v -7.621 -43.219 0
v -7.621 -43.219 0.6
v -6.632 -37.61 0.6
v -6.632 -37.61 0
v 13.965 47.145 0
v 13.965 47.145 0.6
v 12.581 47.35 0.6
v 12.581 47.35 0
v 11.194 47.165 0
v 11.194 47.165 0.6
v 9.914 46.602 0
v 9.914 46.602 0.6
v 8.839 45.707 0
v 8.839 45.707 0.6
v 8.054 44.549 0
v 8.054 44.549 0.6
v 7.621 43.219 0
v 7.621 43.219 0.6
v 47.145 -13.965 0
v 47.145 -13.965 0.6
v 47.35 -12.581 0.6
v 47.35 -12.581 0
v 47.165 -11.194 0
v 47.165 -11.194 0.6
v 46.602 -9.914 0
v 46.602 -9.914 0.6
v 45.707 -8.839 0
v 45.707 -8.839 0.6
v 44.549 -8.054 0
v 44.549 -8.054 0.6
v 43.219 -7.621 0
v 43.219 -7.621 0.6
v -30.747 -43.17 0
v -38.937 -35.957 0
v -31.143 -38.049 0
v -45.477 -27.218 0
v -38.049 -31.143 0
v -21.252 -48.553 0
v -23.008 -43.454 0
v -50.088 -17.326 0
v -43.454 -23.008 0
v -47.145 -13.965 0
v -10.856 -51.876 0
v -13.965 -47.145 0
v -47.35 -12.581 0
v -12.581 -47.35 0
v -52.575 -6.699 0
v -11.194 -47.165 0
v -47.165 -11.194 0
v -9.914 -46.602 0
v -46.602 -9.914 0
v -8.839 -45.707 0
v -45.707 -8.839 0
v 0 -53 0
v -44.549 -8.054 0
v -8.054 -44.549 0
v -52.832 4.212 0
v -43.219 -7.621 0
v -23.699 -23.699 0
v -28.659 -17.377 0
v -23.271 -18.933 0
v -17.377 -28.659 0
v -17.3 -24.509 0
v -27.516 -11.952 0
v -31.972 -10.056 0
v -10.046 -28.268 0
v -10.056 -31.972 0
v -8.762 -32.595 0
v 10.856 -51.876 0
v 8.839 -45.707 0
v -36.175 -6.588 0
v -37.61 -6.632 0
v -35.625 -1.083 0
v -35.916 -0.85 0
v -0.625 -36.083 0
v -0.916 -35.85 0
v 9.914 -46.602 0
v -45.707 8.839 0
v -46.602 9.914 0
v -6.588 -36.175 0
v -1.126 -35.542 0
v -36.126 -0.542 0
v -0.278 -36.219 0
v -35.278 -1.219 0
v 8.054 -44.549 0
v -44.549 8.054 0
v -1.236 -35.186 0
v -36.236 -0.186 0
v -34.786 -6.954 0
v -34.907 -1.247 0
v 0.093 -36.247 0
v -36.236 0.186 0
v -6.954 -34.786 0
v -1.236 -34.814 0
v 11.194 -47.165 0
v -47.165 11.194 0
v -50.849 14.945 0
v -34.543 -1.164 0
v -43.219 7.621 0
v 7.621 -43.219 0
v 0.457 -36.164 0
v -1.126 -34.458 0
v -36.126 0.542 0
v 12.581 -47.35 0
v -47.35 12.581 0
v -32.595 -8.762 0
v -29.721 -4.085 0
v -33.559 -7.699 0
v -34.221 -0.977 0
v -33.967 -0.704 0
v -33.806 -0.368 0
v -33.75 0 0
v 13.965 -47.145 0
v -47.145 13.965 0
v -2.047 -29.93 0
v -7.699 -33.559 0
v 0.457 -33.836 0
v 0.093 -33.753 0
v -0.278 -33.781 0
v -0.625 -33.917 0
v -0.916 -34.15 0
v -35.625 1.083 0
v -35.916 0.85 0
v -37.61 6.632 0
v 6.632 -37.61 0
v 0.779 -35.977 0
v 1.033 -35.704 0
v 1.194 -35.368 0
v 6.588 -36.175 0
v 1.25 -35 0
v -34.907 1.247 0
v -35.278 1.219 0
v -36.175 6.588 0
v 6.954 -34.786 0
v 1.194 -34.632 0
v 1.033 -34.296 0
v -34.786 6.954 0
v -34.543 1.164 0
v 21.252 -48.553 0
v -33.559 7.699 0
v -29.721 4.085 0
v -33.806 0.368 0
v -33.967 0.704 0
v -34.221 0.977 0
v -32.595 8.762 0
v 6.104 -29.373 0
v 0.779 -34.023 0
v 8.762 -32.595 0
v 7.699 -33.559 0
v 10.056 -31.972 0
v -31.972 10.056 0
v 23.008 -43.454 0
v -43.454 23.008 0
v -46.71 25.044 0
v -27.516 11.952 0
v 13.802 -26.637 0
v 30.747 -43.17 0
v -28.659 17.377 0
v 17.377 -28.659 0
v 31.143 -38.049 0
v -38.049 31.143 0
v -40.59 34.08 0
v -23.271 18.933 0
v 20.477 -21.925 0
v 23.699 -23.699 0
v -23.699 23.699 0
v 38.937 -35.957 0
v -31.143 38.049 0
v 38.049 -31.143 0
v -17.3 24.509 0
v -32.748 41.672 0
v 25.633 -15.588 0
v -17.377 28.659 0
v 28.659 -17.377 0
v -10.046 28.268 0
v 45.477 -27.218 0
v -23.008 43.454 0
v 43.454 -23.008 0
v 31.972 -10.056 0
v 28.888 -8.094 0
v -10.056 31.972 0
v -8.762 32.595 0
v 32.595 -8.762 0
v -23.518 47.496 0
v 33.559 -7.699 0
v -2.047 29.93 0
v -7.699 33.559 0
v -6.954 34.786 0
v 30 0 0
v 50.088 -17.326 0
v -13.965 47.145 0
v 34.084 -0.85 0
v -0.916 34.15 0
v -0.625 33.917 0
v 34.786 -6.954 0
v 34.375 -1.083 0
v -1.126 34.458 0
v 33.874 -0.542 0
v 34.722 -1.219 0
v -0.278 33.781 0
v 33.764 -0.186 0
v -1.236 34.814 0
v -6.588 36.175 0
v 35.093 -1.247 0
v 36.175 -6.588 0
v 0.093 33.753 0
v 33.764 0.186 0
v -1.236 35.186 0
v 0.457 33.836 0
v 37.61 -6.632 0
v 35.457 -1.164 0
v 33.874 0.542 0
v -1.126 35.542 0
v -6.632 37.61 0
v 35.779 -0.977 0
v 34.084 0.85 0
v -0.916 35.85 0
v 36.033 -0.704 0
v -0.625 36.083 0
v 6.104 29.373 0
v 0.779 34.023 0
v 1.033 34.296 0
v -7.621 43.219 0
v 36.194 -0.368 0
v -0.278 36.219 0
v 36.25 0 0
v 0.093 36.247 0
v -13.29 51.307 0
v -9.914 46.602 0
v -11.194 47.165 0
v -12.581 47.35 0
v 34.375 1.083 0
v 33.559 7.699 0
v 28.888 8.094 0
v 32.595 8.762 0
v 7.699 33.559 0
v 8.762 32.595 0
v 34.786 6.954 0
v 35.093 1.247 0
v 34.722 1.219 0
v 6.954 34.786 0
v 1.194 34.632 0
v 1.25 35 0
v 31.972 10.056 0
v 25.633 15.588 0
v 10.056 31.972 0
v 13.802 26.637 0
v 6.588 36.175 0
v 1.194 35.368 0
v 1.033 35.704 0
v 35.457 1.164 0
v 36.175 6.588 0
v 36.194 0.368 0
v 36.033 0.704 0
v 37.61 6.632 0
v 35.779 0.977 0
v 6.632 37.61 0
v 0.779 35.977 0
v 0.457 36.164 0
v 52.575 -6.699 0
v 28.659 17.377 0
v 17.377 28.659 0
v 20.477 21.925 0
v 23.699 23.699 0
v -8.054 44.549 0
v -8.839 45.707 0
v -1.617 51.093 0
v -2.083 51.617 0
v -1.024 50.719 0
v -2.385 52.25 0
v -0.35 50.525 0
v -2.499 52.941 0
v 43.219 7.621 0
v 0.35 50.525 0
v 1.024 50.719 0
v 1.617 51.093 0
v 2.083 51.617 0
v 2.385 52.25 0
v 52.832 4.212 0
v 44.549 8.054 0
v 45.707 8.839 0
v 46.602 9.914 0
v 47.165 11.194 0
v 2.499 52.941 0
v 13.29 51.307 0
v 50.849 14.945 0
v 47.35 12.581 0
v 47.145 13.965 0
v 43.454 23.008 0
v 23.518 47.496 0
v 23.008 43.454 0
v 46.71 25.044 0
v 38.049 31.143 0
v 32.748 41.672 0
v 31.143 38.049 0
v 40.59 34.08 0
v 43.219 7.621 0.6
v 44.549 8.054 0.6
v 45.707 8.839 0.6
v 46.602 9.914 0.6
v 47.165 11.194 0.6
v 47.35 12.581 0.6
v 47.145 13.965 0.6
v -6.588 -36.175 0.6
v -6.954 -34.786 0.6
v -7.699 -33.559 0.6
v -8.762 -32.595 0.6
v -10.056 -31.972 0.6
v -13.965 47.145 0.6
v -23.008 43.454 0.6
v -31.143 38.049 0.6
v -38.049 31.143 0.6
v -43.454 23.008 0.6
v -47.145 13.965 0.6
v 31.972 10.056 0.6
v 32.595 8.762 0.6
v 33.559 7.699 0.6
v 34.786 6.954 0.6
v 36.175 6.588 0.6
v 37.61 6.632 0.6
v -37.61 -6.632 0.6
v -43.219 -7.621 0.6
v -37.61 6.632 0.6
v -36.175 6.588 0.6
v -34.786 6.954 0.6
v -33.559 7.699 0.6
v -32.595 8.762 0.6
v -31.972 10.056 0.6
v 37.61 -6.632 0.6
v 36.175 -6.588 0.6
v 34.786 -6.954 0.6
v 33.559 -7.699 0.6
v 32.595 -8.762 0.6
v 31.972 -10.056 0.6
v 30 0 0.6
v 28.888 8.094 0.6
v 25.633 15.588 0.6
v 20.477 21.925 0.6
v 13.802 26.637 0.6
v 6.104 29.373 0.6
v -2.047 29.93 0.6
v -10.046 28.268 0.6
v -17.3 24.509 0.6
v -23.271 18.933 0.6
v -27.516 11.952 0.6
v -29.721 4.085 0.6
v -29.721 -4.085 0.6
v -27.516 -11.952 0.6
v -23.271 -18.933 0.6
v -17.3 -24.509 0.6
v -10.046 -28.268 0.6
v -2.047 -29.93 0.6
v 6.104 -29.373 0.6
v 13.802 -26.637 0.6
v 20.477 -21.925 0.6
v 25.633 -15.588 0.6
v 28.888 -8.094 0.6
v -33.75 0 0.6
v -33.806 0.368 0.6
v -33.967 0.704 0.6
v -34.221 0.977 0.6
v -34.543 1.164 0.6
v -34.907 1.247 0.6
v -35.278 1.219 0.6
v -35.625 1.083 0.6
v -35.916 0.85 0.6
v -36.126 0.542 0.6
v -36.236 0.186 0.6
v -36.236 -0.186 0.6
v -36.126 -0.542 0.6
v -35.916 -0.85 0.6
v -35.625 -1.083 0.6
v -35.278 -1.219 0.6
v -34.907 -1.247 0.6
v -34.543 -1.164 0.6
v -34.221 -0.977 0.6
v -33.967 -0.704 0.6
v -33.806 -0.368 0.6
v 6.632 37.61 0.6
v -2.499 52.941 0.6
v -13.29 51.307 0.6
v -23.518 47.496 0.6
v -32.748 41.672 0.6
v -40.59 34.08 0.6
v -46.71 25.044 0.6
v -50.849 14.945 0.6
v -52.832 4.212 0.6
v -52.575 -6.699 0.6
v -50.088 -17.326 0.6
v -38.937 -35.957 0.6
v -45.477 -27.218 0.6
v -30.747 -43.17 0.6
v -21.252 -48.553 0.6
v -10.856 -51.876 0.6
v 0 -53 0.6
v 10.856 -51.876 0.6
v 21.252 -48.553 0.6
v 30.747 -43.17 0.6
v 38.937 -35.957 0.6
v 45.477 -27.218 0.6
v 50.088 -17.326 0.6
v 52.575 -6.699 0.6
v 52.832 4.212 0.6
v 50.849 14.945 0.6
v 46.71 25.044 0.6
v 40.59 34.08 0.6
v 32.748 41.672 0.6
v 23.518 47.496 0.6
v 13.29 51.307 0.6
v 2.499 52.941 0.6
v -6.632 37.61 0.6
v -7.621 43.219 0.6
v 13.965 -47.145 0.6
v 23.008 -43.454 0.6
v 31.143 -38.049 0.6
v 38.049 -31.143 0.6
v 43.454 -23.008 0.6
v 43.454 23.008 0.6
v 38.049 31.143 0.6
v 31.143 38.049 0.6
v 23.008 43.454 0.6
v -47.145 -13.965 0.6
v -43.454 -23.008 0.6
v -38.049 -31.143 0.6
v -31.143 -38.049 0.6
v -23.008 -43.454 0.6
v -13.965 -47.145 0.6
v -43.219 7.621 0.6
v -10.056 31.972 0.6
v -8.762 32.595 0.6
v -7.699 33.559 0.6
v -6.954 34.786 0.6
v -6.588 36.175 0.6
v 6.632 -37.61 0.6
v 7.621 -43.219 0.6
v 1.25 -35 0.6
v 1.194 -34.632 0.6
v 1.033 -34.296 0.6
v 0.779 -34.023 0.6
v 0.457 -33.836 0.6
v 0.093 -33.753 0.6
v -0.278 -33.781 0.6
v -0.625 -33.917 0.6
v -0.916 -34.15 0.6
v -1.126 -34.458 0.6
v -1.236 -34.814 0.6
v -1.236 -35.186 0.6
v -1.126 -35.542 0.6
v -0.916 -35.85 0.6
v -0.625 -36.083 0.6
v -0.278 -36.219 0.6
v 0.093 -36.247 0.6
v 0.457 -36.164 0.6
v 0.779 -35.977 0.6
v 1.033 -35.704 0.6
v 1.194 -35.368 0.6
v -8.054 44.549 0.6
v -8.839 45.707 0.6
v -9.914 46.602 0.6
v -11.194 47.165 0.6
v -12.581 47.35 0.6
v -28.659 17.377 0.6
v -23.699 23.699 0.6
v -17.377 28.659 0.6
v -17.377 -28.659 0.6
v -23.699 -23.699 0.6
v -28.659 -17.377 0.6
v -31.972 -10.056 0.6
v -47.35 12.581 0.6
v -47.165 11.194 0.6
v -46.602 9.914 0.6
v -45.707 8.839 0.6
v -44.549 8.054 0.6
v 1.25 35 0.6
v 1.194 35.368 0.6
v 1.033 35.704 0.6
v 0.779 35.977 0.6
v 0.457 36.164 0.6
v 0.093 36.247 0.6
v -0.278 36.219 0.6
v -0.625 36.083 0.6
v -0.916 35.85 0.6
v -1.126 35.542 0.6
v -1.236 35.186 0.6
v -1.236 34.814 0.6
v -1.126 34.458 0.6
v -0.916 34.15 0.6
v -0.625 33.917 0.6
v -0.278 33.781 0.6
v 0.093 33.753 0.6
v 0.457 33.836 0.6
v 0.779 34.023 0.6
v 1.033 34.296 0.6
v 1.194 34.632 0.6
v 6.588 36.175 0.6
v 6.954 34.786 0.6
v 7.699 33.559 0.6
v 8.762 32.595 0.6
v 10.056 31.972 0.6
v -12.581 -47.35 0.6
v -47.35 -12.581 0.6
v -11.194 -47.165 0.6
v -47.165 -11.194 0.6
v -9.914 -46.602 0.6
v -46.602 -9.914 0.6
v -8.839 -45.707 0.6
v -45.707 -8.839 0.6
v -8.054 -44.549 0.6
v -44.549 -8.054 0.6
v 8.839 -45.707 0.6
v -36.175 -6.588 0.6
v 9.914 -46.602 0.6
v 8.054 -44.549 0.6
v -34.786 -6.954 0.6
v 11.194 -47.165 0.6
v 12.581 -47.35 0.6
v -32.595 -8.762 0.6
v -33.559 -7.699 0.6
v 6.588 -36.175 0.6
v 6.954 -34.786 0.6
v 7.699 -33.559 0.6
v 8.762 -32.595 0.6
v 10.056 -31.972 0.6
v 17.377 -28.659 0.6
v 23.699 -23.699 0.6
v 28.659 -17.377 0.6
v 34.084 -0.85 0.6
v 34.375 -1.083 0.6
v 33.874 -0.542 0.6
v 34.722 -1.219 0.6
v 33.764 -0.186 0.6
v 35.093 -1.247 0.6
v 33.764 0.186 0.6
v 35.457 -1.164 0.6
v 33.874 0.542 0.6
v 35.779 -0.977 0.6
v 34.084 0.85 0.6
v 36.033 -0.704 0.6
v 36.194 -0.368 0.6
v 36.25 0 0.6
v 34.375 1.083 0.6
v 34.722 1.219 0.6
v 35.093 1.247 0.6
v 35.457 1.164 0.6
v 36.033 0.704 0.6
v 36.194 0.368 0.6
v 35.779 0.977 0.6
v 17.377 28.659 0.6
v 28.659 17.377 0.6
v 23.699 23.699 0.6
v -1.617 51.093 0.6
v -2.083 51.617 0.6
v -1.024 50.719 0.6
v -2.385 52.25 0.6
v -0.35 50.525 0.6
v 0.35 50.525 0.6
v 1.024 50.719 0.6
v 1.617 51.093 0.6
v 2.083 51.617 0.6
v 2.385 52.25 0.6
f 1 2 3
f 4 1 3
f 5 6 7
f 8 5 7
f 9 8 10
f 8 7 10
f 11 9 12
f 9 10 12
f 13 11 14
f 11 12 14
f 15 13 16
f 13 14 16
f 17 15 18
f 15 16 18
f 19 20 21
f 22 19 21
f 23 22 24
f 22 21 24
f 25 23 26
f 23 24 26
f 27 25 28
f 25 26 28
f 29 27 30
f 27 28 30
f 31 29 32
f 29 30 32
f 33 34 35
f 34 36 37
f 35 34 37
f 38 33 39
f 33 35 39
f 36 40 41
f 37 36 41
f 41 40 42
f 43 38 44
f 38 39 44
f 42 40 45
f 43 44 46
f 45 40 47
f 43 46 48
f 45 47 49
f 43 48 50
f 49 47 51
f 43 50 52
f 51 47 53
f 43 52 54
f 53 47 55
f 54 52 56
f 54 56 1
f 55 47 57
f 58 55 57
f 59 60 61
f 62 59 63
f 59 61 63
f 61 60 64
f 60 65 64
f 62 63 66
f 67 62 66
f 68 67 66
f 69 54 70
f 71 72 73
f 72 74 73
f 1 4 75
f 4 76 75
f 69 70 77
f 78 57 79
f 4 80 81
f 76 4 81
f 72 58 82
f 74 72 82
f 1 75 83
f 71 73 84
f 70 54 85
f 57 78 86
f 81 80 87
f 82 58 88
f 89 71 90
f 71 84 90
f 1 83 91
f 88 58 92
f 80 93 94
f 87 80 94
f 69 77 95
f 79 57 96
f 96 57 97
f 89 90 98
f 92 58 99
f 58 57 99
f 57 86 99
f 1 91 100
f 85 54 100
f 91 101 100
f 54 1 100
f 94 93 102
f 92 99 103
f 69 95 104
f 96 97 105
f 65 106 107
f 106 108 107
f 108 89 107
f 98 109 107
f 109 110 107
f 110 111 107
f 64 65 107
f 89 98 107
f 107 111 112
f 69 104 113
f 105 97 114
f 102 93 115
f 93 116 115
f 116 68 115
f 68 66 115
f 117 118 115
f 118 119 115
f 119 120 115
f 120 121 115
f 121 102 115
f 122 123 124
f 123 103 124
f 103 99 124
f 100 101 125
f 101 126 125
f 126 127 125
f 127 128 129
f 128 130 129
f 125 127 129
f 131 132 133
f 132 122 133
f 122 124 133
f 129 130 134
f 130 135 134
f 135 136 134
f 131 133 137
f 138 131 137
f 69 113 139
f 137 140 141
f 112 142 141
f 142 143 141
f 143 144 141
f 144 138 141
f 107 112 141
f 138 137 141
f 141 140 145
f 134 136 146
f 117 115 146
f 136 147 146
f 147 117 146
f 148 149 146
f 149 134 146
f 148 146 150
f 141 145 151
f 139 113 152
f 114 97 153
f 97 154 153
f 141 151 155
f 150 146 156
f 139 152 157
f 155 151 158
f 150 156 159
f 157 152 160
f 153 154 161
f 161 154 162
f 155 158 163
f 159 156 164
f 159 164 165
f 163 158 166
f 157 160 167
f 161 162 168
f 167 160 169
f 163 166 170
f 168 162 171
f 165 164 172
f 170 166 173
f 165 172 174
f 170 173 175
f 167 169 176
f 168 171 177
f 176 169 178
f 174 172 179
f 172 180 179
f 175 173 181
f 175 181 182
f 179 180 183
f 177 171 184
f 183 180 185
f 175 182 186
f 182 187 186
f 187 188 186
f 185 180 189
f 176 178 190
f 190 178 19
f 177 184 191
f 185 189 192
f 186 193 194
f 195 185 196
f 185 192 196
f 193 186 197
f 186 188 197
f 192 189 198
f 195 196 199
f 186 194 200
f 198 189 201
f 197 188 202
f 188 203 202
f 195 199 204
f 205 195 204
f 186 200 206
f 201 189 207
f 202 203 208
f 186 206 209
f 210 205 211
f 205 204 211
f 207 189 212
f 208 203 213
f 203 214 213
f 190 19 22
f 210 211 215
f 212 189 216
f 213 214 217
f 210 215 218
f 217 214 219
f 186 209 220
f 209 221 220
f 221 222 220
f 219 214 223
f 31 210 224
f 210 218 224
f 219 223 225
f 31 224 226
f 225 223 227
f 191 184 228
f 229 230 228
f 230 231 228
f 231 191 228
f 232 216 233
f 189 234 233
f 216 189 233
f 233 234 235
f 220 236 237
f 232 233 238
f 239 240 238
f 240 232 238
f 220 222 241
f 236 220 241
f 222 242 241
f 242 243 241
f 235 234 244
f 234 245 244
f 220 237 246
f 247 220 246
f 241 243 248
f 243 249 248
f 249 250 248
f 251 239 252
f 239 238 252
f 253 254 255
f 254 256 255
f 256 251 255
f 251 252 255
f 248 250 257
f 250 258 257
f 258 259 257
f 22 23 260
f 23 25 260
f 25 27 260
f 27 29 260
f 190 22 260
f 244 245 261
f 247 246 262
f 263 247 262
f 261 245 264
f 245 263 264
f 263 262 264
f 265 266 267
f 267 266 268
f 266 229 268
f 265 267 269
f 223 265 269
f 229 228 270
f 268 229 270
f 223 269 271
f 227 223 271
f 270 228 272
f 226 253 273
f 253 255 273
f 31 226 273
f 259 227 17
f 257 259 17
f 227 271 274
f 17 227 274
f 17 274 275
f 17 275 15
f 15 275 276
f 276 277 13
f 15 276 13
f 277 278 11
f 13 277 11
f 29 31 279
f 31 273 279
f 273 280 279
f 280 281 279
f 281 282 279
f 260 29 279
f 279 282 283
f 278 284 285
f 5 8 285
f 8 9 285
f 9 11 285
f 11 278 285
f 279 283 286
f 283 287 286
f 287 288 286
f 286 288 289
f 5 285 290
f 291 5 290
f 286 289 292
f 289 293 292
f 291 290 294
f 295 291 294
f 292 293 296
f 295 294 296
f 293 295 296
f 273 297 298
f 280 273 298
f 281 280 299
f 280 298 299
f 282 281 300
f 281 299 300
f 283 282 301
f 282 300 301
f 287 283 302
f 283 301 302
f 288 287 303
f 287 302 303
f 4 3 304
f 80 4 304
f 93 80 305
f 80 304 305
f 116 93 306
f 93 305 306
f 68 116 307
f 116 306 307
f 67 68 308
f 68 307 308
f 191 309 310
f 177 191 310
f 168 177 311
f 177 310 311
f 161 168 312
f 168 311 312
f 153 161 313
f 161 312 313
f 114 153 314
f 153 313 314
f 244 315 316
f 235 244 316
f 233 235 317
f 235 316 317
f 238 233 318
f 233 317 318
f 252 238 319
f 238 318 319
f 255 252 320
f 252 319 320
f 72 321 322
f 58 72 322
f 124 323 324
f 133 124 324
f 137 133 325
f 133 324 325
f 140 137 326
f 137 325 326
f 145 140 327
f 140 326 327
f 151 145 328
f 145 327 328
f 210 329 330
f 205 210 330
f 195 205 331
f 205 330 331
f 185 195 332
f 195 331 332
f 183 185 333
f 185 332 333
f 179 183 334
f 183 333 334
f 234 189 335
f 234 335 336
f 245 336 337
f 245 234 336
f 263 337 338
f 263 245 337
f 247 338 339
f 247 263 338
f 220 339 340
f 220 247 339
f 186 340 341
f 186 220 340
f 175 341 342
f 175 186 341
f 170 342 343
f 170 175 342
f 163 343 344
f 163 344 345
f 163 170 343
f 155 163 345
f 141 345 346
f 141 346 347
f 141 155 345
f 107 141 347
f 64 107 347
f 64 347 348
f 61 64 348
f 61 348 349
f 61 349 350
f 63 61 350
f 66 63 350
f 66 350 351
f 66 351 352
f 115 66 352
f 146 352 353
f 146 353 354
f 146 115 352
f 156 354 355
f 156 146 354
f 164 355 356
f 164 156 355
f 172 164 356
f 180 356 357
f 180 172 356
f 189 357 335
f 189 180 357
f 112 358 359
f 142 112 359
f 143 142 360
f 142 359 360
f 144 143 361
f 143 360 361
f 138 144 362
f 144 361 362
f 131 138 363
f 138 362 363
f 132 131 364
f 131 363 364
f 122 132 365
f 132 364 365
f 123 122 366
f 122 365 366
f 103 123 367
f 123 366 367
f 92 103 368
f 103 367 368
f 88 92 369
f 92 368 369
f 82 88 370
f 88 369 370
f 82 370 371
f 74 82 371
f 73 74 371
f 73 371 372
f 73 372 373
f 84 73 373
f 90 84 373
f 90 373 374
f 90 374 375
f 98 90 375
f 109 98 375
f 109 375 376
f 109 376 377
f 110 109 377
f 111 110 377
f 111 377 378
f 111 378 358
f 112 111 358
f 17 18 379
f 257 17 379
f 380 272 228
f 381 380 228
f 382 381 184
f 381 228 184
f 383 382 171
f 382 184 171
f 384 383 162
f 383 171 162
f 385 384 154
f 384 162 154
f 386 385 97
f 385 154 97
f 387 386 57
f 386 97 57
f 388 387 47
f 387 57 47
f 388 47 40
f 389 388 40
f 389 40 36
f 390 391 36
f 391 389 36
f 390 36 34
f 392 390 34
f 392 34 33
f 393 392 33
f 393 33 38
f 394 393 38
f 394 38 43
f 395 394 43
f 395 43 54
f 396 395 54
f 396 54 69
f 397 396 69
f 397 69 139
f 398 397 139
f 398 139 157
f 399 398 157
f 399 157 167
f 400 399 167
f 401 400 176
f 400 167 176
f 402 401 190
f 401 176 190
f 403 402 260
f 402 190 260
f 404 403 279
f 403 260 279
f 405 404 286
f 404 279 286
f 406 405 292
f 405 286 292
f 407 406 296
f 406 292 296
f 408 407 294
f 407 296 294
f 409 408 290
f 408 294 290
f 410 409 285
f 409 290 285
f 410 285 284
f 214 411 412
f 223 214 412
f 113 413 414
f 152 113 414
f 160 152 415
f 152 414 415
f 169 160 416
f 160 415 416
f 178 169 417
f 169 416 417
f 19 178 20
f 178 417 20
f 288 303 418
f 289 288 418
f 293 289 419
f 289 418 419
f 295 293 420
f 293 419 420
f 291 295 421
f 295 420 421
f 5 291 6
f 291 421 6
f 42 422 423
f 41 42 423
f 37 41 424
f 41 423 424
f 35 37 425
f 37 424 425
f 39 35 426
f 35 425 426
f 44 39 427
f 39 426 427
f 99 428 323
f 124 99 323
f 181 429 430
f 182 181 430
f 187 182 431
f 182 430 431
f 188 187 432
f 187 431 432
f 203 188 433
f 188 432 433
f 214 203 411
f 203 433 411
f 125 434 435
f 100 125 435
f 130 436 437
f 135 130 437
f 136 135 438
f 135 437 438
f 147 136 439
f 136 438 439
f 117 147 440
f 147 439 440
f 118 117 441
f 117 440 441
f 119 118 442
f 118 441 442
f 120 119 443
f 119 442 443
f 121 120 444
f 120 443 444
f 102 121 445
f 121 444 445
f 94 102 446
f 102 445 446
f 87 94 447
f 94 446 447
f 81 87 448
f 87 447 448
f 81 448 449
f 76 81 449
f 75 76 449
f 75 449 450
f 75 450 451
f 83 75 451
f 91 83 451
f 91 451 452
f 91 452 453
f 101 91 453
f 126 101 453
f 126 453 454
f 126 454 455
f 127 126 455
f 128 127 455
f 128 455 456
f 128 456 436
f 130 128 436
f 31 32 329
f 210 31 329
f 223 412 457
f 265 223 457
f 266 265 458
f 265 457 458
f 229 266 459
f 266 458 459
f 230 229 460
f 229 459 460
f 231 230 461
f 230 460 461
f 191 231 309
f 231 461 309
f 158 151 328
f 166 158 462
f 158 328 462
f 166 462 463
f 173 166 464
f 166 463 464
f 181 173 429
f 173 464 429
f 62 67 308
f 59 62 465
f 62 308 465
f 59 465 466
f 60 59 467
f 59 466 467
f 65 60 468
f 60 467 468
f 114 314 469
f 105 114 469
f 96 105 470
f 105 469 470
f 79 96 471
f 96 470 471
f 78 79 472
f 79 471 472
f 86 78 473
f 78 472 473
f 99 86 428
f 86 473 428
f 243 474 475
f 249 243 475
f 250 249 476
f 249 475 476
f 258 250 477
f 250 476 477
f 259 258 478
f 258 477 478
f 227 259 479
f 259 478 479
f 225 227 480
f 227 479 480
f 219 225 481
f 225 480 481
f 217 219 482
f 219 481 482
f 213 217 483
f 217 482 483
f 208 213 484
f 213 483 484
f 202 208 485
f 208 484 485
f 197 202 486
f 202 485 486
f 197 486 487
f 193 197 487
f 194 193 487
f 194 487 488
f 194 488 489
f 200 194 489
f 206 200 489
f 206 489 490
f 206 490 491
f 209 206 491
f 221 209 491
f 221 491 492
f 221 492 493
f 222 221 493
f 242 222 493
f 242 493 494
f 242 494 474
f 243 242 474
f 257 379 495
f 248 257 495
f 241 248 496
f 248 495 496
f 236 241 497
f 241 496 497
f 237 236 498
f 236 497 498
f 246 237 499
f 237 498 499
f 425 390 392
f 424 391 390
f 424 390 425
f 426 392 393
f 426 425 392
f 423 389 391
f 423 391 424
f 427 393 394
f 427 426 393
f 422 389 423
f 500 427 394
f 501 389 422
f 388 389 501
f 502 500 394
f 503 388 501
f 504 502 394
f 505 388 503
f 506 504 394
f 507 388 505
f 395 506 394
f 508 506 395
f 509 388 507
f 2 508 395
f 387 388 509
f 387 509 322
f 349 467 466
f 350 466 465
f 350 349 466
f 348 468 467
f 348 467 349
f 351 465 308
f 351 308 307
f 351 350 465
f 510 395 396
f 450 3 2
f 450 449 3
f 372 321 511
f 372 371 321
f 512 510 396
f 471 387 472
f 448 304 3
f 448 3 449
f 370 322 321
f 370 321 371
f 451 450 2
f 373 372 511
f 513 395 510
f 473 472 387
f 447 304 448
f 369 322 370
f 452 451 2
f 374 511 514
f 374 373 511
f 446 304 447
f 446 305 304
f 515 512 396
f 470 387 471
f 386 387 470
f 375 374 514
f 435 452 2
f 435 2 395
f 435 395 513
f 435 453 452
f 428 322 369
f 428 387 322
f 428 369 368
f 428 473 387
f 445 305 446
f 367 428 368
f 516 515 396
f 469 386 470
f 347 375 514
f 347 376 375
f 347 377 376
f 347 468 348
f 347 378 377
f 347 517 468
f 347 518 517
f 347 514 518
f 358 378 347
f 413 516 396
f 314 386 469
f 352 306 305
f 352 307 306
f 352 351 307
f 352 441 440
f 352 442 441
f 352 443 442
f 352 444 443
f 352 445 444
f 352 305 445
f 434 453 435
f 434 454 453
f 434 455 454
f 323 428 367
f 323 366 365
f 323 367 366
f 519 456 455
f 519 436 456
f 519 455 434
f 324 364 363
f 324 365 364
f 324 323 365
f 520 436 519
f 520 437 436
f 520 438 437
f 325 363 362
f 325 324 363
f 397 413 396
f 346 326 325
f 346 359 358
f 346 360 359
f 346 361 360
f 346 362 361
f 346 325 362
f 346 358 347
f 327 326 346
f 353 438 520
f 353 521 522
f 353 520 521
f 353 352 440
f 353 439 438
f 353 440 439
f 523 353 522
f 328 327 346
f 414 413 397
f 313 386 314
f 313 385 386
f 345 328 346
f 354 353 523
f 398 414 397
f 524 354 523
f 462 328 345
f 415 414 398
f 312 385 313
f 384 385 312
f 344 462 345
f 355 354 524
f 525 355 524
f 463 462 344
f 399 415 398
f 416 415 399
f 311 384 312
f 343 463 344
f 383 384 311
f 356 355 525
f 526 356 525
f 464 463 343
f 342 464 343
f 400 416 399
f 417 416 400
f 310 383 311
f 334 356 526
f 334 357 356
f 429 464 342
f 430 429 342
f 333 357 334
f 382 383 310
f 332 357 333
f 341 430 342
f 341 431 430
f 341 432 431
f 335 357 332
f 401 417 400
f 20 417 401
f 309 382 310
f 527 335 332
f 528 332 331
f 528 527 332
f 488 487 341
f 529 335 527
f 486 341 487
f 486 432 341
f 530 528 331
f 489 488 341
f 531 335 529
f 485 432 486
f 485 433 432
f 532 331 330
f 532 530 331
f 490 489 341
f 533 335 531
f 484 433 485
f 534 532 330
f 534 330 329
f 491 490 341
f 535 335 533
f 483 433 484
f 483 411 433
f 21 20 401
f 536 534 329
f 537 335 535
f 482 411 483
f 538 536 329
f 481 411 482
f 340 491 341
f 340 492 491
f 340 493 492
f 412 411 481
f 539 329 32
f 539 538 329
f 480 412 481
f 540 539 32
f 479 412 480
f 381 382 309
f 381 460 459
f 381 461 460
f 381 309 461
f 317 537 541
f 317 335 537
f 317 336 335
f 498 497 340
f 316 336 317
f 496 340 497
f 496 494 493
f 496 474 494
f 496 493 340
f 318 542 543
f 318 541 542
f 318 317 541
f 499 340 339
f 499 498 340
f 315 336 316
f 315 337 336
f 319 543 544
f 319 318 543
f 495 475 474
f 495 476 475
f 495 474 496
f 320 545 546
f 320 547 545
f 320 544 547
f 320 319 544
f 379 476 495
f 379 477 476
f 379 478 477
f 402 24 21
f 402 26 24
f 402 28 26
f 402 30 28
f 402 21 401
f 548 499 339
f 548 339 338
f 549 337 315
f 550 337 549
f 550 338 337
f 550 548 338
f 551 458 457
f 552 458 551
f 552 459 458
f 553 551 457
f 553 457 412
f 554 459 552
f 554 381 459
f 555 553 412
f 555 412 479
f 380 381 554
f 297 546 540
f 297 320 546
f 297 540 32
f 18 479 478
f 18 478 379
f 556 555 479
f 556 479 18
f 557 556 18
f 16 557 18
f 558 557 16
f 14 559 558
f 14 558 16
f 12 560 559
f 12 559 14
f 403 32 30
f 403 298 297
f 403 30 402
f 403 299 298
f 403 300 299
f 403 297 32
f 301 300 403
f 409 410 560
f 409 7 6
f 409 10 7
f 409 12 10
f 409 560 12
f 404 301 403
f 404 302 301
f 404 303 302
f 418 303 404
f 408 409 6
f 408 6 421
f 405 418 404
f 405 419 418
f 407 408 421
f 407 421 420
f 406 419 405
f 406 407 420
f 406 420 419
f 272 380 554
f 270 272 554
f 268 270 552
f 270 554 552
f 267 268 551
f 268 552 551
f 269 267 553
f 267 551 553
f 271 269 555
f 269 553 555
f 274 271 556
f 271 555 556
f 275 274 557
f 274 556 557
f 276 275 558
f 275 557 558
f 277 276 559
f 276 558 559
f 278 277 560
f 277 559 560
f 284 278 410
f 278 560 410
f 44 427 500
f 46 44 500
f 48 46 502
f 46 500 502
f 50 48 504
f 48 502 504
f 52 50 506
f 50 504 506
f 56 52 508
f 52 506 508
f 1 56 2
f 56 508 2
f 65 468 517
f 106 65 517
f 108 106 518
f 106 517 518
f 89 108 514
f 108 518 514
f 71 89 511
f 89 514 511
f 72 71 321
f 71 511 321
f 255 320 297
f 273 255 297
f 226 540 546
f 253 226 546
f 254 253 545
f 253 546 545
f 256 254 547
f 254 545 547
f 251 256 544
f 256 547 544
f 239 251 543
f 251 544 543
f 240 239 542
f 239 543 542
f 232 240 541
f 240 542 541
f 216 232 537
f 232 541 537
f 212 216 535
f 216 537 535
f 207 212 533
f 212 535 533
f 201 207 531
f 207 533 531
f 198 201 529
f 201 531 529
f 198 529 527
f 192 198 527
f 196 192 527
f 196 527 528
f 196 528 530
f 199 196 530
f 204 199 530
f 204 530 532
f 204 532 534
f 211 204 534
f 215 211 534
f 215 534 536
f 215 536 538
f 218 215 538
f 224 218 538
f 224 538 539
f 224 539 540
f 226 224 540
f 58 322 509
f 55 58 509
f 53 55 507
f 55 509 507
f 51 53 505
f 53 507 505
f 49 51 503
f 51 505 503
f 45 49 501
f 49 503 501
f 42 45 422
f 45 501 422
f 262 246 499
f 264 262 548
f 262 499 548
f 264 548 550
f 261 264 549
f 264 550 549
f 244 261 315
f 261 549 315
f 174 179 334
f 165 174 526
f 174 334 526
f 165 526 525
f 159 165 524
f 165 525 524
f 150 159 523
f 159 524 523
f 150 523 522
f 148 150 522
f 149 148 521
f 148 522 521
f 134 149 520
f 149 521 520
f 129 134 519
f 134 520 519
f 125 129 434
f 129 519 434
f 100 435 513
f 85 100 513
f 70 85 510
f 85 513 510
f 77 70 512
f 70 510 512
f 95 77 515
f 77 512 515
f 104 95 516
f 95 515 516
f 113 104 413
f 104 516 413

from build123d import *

# Parameters (mm, degrees)
F0_R     = 53
F0_R_2   = 30
F1_DEPTH = 0.6
F2_R     = 1.25
F3_DEPTH = 25
F5_DEPTH = 25
F7_DEPTH = 2


with BuildPart() as f1:
    # F0 (on Top) → F1 (new body)
    with BuildSketch(Plane.XY):
        Circle(F0_R)
        Circle(F0_R_2, mode=Mode.SUBTRACT)
    extrude(amount=F1_DEPTH)

    # F2 (on face) → F3 (cut)
    with BuildSketch(Plane.XY.offset(0.6)):
        with Locations((0, 35)):
            Circle(F2_R)
        with Locations((35, 0)):
            Circle(F2_R)
        with Locations((0, -35)):
            Circle(F2_R)
        with Locations((-35, 0)):
            Circle(F2_R)
    extrude(amount=-F3_DEPTH, mode=Mode.SUBTRACT)

    # F4 (on face) → F5 (cut)
    with BuildSketch(Plane.XY.offset(0.6)):
        with BuildLine():
            ThreePointArc((2.499305, 52.941038), (0, 53), (-2.499305, 52.941038))
            ThreePointArc((-2.499305, 52.941038), (0, 50.5), (2.499305, 52.941038))
        make_face()
    extrude(amount=-F5_DEPTH, mode=Mode.SUBTRACT)

    # F6 (on face) → F7 (cut)
    with BuildSketch(Plane.XY.offset(0.6)):
        with BuildLine():
            Line((-43.218802, 7.620641), (-37.609581, 6.631584))
            ThreePointArc((-37.609581, 6.631584), (-34.145946, 7.281991), (-31.971682, 10.055504))
            ThreePointArc((-31.971682, 10.055504), (-23.699173, 23.699173), (-10.055504, 31.971682))
            ThreePointArc((-10.055504, 31.971682), (-7.281991, 34.145946), (-6.631584, 37.609581))
            Line((-6.631584, 37.609581), (-7.620641, 43.218802))
            ThreePointArc((-7.620641, 43.218802), (-9.913604, 46.602319), (-13.964743, 47.144664))
            ThreePointArc((-13.964743, 47.144664), (-34.768041, 34.768041), (-47.144664, 13.964743))
            ThreePointArc((-47.144664, 13.964743), (-46.602319, 9.913604), (-43.218802, 7.620641))
        make_face()
        with BuildLine():
            Line((7.620641, 43.218802), (6.631584, 37.609581))
            ThreePointArc((6.631584, 37.609581), (7.281991, 34.145946), (10.055504, 31.971682))
            ThreePointArc((10.055504, 31.971682), (23.699173, 23.699173), (31.971682, 10.055504))
            ThreePointArc((31.971682, 10.055504), (34.145946, 7.281991), (37.609581, 6.631584))
            Line((37.609581, 6.631584), (43.218802, 7.620641))
            ThreePointArc((43.218802, 7.620641), (46.602319, 9.913604), (47.144664, 13.964743))
            ThreePointArc((47.144664, 13.964743), (34.768041, 34.768041), (13.964743, 47.144664))
            ThreePointArc((13.964743, 47.144664), (9.913604, 46.602319), (7.620641, 43.218802))
        make_face()
        with BuildLine():
            ThreePointArc((31.971682, -10.055504), (23.699173, -23.699173), (10.055504, -31.971682))
            ThreePointArc((10.055504, -31.971682), (7.281991, -34.145946), (6.631584, -37.609581))
            Line((6.631584, -37.609581), (7.620641, -43.218802))
            ThreePointArc((7.620641, -43.218802), (9.913604, -46.602319), (13.964743, -47.144664))
            ThreePointArc((13.964743, -47.144664), (34.768041, -34.768041), (47.144664, -13.964743))
            ThreePointArc((47.144664, -13.964743), (46.602319, -9.913604), (43.218802, -7.620641))
            Line((43.218802, -7.620641), (37.609581, -6.631584))
            ThreePointArc((37.609581, -6.631584), (34.145946, -7.281991), (31.971682, -10.055504))
        make_face()
        with BuildLine():
            ThreePointArc((-10.055504, -31.971682), (-23.699173, -23.699173), (-31.971682, -10.055504))
            ThreePointArc((-31.971682, -10.055504), (-34.145946, -7.281991), (-37.609581, -6.631584))
            Line((-37.609581, -6.631584), (-43.218802, -7.620641))
            ThreePointArc((-43.218802, -7.620641), (-46.602319, -9.913604), (-47.144664, -13.964743))
            ThreePointArc((-47.144664, -13.964743), (-34.768041, -34.768041), (-13.964743, -47.144664))
            ThreePointArc((-13.964743, -47.144664), (-9.913604, -46.602319), (-7.620641, -43.218802))
            Line((-7.620641, -43.218802), (-6.631584, -37.609581))
            ThreePointArc((-6.631584, -37.609581), (-7.281991, -34.145946), (-10.055504, -31.971682))
        make_face()
    extrude(amount=-F7_DEPTH, mode=Mode.SUBTRACT)


solid = f1.part
